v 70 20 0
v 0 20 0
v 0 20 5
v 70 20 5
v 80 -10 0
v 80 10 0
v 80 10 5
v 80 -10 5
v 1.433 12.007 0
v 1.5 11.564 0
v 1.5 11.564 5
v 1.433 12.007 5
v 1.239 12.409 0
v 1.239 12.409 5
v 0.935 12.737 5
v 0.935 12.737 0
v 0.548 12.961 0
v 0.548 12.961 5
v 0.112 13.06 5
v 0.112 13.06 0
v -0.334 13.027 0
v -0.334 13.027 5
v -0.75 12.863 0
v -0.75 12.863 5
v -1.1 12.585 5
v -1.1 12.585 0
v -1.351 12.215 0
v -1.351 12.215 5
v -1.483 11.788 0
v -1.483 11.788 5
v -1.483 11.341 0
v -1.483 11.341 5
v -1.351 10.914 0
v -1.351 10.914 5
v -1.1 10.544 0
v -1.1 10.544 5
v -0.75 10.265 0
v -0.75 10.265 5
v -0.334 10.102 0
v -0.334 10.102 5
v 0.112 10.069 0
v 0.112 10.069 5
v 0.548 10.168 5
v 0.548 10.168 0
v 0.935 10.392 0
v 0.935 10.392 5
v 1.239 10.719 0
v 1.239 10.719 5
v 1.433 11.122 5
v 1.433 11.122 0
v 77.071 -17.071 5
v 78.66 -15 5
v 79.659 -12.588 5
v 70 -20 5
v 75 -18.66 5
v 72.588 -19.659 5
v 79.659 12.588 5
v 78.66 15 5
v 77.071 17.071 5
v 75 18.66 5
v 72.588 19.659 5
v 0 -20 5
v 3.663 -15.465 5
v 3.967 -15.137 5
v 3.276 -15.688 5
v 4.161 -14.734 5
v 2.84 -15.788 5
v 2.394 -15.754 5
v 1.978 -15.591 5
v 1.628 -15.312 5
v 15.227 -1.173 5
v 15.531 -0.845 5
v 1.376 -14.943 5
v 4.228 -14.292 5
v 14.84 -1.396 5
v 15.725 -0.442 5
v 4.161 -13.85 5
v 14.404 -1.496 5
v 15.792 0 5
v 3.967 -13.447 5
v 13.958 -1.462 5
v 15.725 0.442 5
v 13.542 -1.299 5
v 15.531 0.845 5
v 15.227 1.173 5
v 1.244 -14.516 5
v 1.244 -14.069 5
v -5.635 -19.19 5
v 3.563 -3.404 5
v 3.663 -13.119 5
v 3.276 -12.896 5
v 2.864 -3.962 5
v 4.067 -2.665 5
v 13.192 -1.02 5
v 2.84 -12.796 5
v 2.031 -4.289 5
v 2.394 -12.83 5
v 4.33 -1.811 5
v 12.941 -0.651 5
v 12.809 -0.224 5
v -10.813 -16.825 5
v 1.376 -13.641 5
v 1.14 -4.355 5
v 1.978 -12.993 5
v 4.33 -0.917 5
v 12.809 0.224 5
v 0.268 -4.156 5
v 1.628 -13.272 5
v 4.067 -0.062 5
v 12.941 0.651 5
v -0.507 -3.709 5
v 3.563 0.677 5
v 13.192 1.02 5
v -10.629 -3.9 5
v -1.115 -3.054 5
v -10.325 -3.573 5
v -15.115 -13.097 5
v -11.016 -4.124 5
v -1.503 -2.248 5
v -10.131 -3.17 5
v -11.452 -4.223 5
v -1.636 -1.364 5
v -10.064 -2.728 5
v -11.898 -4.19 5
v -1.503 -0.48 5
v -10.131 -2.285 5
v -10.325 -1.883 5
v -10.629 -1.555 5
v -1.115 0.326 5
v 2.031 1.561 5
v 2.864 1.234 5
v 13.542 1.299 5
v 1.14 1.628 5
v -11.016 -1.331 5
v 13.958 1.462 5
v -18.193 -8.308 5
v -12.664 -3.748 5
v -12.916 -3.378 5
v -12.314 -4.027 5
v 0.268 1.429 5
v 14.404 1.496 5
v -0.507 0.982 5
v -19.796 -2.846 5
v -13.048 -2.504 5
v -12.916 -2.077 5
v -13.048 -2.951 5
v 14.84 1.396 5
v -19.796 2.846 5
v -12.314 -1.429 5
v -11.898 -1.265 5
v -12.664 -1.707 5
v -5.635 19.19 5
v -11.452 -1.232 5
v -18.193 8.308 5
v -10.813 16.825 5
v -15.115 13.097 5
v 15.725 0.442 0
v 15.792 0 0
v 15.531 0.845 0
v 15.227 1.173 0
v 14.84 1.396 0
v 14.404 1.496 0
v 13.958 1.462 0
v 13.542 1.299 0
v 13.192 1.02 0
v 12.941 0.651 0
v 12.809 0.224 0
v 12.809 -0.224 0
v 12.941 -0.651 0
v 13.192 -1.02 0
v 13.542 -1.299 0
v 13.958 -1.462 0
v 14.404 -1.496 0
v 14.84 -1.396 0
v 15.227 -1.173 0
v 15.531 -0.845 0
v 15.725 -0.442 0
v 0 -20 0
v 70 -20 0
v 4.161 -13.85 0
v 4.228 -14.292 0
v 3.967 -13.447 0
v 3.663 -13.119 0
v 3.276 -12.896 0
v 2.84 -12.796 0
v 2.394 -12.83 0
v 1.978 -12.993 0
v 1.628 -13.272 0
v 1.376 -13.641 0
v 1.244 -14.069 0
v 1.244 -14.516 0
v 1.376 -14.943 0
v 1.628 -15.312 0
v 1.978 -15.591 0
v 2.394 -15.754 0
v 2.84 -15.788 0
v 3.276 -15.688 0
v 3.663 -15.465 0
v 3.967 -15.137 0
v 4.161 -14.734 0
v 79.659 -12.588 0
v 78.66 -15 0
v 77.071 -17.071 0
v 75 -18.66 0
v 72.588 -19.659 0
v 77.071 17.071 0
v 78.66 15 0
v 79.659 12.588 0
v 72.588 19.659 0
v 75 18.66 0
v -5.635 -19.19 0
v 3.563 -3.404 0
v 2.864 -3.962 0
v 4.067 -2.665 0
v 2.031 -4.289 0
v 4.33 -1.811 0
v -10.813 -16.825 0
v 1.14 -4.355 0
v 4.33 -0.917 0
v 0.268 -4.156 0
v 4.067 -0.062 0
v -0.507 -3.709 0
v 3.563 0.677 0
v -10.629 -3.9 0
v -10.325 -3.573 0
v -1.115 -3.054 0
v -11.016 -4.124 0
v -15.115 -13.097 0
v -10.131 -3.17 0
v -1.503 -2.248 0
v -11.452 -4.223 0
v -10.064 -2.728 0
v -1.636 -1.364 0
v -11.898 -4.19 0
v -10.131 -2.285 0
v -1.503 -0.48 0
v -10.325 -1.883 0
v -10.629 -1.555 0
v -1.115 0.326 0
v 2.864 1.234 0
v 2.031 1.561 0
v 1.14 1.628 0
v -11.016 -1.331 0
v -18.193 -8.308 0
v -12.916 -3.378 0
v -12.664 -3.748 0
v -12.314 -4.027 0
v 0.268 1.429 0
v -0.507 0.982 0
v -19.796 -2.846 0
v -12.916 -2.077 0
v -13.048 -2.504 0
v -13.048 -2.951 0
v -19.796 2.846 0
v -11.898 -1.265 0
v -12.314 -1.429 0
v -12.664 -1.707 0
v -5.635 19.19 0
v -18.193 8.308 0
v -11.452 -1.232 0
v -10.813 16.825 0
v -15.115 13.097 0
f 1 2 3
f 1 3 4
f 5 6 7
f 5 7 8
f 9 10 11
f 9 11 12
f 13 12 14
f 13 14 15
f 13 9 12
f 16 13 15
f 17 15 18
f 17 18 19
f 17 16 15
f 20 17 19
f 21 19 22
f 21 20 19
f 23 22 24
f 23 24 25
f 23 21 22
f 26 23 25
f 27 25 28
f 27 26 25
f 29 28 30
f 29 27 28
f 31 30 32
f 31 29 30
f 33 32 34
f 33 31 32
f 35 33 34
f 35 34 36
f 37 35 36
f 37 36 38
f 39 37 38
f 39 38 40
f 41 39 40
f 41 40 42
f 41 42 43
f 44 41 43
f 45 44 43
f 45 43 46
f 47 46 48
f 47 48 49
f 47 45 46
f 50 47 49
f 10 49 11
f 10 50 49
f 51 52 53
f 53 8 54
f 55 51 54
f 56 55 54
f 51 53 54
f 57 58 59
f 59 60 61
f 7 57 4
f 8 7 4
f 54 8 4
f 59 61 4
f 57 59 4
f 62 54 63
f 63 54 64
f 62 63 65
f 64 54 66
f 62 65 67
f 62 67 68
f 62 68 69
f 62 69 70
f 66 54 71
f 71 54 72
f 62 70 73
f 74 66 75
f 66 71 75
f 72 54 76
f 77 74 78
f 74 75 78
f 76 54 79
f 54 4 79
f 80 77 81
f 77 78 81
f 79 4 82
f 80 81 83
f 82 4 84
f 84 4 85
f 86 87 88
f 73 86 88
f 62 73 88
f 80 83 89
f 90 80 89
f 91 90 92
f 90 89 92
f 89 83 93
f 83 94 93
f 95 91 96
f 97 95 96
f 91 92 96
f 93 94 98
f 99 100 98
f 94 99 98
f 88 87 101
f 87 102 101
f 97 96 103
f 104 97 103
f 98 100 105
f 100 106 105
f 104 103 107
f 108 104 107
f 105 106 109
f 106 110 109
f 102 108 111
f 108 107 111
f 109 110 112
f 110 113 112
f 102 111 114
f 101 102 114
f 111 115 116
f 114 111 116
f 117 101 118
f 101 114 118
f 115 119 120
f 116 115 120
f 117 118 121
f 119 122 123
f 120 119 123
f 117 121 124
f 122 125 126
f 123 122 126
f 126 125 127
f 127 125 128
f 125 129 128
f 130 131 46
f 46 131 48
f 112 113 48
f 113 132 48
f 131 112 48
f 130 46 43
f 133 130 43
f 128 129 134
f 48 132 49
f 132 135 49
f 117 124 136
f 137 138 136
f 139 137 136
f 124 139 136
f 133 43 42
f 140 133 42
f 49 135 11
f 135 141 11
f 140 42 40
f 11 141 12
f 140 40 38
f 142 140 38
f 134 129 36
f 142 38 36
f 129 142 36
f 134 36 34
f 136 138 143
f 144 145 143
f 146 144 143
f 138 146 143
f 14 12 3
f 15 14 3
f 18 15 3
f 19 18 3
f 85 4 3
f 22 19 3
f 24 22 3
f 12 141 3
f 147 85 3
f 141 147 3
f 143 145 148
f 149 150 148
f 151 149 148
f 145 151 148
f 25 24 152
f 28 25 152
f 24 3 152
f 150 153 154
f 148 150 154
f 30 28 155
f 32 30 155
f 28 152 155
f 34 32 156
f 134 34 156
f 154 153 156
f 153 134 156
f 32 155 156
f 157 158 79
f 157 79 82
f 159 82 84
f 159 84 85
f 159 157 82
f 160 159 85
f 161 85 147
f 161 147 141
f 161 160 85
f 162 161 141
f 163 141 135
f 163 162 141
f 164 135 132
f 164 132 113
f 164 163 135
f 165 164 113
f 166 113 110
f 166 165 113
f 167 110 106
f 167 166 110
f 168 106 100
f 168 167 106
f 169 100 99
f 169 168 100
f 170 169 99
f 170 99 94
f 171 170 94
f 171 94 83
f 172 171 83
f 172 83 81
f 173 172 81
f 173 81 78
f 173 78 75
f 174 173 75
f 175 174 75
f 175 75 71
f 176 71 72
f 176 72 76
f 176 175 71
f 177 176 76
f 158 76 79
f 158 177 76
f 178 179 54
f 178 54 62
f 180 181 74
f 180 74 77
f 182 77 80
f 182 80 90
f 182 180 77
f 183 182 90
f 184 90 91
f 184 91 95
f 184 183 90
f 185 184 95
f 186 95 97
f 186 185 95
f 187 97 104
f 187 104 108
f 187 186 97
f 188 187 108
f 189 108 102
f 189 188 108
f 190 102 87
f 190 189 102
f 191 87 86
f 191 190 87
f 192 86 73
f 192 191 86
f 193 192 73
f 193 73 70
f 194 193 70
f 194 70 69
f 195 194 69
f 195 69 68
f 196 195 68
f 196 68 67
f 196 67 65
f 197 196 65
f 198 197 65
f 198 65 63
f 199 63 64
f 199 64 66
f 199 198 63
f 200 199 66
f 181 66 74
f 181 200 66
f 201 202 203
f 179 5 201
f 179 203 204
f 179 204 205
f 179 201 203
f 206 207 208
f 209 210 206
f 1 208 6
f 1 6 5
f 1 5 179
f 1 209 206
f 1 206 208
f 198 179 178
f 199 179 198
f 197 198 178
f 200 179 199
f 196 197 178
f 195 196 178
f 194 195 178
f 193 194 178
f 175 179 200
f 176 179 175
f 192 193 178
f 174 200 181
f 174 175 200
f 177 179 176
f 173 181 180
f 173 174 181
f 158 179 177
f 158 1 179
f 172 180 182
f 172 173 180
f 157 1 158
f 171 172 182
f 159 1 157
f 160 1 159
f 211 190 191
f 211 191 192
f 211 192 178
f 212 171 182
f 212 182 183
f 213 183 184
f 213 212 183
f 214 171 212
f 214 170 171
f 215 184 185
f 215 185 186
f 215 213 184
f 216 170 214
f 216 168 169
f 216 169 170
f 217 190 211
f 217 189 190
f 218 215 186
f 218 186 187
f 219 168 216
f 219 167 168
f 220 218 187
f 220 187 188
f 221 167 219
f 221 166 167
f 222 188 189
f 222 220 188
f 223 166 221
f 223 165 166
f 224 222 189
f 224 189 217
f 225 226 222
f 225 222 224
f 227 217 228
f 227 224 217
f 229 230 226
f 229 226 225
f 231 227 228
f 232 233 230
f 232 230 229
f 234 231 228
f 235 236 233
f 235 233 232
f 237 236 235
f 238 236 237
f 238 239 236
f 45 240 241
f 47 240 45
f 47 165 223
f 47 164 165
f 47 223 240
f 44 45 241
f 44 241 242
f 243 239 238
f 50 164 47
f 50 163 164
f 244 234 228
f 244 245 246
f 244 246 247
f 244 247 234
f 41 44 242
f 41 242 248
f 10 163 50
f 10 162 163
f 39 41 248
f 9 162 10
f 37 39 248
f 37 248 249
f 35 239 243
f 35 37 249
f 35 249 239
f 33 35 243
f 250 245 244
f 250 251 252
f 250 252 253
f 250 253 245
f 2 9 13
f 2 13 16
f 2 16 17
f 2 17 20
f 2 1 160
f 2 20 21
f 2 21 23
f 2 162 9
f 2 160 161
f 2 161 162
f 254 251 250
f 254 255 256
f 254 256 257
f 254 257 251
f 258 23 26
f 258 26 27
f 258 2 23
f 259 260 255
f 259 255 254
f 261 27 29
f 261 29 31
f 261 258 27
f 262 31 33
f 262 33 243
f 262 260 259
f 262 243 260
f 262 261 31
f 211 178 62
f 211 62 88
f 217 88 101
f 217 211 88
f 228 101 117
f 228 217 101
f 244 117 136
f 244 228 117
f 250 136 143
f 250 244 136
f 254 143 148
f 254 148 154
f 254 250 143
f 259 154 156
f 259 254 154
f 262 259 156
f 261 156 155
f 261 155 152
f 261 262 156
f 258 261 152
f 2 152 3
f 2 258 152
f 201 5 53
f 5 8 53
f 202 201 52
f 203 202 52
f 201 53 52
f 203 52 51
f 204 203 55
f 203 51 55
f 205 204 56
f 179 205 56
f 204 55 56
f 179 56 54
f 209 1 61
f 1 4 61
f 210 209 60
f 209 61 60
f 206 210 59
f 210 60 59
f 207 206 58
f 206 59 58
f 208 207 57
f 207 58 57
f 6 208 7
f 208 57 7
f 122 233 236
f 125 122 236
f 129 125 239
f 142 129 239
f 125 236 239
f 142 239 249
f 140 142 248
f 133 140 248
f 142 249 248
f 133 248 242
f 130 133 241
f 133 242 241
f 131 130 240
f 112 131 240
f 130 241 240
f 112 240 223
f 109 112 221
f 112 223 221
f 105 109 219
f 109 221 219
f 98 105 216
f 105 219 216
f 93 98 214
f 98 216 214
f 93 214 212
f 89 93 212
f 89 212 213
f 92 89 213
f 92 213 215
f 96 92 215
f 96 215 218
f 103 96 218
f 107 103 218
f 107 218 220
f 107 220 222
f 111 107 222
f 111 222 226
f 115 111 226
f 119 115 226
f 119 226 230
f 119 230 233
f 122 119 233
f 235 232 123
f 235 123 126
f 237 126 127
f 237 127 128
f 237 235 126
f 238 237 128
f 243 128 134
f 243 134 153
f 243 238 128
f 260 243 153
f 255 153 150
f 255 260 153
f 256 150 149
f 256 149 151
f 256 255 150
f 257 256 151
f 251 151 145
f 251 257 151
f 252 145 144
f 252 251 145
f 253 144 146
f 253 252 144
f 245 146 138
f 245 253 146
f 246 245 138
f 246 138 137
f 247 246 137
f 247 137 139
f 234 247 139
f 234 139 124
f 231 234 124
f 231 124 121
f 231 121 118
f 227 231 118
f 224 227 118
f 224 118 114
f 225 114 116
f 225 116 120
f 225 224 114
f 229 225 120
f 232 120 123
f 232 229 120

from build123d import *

# Parameters (mm, degrees)
SKETCH1_R           = 1.5
BOSS_EXTRUDE1_DEPTH = 5
SKETCH2_R           = 3
CUT_EXTRUDE1_DEPTH  = 10
FILLET1_R           = 10


with BuildPart() as part:
    # Sketch1 → Boss-Extrude1 (new body)
    with BuildSketch(Plane.XY):
        with BuildLine():
            Line((0, 20), (80, 20))
            Line((80, 20), (80, -20))
            Line((80, -20), (0, -20))
            ThreePointArc((0, -20), (-20, 0), (0, 20))
        make_face()
        with Locations((0, 11.564458964)):
            Circle(SKETCH1_R, mode=Mode.SUBTRACT)
        with Locations((14.292070839, 0)):
            Circle(SKETCH1_R, mode=Mode.SUBTRACT)
        with Locations((2.727611874, -14.292070839)):
            Circle(SKETCH1_R, mode=Mode.SUBTRACT)
        with Locations((-11.564458964, -2.727611874)):
            Circle(SKETCH1_R, mode=Mode.SUBTRACT)
    extrude(amount=BOSS_EXTRUDE1_DEPTH)

    # Sketch2 → Cut-Extrude1 (cut)
    with BuildSketch(Plane(origin=(0, 0, 0), x_dir=(-1, 0, 0), z_dir=(0, 0, -1))):
        with Locations((-1.363805937, -1.363805937)):
            Circle(SKETCH2_R)
    extrude(amount=-CUT_EXTRUDE1_DEPTH, mode=Mode.SUBTRACT)

    # Fillet1
    fillet1_edges = [part.edges().sort_by_distance(p)[0] for p in [
        (80, 20, 2.5),
        (80, -20, 2.5),
    ]]
    fillet(fillet1_edges, radius=FILLET1_R)


solid = part.part
